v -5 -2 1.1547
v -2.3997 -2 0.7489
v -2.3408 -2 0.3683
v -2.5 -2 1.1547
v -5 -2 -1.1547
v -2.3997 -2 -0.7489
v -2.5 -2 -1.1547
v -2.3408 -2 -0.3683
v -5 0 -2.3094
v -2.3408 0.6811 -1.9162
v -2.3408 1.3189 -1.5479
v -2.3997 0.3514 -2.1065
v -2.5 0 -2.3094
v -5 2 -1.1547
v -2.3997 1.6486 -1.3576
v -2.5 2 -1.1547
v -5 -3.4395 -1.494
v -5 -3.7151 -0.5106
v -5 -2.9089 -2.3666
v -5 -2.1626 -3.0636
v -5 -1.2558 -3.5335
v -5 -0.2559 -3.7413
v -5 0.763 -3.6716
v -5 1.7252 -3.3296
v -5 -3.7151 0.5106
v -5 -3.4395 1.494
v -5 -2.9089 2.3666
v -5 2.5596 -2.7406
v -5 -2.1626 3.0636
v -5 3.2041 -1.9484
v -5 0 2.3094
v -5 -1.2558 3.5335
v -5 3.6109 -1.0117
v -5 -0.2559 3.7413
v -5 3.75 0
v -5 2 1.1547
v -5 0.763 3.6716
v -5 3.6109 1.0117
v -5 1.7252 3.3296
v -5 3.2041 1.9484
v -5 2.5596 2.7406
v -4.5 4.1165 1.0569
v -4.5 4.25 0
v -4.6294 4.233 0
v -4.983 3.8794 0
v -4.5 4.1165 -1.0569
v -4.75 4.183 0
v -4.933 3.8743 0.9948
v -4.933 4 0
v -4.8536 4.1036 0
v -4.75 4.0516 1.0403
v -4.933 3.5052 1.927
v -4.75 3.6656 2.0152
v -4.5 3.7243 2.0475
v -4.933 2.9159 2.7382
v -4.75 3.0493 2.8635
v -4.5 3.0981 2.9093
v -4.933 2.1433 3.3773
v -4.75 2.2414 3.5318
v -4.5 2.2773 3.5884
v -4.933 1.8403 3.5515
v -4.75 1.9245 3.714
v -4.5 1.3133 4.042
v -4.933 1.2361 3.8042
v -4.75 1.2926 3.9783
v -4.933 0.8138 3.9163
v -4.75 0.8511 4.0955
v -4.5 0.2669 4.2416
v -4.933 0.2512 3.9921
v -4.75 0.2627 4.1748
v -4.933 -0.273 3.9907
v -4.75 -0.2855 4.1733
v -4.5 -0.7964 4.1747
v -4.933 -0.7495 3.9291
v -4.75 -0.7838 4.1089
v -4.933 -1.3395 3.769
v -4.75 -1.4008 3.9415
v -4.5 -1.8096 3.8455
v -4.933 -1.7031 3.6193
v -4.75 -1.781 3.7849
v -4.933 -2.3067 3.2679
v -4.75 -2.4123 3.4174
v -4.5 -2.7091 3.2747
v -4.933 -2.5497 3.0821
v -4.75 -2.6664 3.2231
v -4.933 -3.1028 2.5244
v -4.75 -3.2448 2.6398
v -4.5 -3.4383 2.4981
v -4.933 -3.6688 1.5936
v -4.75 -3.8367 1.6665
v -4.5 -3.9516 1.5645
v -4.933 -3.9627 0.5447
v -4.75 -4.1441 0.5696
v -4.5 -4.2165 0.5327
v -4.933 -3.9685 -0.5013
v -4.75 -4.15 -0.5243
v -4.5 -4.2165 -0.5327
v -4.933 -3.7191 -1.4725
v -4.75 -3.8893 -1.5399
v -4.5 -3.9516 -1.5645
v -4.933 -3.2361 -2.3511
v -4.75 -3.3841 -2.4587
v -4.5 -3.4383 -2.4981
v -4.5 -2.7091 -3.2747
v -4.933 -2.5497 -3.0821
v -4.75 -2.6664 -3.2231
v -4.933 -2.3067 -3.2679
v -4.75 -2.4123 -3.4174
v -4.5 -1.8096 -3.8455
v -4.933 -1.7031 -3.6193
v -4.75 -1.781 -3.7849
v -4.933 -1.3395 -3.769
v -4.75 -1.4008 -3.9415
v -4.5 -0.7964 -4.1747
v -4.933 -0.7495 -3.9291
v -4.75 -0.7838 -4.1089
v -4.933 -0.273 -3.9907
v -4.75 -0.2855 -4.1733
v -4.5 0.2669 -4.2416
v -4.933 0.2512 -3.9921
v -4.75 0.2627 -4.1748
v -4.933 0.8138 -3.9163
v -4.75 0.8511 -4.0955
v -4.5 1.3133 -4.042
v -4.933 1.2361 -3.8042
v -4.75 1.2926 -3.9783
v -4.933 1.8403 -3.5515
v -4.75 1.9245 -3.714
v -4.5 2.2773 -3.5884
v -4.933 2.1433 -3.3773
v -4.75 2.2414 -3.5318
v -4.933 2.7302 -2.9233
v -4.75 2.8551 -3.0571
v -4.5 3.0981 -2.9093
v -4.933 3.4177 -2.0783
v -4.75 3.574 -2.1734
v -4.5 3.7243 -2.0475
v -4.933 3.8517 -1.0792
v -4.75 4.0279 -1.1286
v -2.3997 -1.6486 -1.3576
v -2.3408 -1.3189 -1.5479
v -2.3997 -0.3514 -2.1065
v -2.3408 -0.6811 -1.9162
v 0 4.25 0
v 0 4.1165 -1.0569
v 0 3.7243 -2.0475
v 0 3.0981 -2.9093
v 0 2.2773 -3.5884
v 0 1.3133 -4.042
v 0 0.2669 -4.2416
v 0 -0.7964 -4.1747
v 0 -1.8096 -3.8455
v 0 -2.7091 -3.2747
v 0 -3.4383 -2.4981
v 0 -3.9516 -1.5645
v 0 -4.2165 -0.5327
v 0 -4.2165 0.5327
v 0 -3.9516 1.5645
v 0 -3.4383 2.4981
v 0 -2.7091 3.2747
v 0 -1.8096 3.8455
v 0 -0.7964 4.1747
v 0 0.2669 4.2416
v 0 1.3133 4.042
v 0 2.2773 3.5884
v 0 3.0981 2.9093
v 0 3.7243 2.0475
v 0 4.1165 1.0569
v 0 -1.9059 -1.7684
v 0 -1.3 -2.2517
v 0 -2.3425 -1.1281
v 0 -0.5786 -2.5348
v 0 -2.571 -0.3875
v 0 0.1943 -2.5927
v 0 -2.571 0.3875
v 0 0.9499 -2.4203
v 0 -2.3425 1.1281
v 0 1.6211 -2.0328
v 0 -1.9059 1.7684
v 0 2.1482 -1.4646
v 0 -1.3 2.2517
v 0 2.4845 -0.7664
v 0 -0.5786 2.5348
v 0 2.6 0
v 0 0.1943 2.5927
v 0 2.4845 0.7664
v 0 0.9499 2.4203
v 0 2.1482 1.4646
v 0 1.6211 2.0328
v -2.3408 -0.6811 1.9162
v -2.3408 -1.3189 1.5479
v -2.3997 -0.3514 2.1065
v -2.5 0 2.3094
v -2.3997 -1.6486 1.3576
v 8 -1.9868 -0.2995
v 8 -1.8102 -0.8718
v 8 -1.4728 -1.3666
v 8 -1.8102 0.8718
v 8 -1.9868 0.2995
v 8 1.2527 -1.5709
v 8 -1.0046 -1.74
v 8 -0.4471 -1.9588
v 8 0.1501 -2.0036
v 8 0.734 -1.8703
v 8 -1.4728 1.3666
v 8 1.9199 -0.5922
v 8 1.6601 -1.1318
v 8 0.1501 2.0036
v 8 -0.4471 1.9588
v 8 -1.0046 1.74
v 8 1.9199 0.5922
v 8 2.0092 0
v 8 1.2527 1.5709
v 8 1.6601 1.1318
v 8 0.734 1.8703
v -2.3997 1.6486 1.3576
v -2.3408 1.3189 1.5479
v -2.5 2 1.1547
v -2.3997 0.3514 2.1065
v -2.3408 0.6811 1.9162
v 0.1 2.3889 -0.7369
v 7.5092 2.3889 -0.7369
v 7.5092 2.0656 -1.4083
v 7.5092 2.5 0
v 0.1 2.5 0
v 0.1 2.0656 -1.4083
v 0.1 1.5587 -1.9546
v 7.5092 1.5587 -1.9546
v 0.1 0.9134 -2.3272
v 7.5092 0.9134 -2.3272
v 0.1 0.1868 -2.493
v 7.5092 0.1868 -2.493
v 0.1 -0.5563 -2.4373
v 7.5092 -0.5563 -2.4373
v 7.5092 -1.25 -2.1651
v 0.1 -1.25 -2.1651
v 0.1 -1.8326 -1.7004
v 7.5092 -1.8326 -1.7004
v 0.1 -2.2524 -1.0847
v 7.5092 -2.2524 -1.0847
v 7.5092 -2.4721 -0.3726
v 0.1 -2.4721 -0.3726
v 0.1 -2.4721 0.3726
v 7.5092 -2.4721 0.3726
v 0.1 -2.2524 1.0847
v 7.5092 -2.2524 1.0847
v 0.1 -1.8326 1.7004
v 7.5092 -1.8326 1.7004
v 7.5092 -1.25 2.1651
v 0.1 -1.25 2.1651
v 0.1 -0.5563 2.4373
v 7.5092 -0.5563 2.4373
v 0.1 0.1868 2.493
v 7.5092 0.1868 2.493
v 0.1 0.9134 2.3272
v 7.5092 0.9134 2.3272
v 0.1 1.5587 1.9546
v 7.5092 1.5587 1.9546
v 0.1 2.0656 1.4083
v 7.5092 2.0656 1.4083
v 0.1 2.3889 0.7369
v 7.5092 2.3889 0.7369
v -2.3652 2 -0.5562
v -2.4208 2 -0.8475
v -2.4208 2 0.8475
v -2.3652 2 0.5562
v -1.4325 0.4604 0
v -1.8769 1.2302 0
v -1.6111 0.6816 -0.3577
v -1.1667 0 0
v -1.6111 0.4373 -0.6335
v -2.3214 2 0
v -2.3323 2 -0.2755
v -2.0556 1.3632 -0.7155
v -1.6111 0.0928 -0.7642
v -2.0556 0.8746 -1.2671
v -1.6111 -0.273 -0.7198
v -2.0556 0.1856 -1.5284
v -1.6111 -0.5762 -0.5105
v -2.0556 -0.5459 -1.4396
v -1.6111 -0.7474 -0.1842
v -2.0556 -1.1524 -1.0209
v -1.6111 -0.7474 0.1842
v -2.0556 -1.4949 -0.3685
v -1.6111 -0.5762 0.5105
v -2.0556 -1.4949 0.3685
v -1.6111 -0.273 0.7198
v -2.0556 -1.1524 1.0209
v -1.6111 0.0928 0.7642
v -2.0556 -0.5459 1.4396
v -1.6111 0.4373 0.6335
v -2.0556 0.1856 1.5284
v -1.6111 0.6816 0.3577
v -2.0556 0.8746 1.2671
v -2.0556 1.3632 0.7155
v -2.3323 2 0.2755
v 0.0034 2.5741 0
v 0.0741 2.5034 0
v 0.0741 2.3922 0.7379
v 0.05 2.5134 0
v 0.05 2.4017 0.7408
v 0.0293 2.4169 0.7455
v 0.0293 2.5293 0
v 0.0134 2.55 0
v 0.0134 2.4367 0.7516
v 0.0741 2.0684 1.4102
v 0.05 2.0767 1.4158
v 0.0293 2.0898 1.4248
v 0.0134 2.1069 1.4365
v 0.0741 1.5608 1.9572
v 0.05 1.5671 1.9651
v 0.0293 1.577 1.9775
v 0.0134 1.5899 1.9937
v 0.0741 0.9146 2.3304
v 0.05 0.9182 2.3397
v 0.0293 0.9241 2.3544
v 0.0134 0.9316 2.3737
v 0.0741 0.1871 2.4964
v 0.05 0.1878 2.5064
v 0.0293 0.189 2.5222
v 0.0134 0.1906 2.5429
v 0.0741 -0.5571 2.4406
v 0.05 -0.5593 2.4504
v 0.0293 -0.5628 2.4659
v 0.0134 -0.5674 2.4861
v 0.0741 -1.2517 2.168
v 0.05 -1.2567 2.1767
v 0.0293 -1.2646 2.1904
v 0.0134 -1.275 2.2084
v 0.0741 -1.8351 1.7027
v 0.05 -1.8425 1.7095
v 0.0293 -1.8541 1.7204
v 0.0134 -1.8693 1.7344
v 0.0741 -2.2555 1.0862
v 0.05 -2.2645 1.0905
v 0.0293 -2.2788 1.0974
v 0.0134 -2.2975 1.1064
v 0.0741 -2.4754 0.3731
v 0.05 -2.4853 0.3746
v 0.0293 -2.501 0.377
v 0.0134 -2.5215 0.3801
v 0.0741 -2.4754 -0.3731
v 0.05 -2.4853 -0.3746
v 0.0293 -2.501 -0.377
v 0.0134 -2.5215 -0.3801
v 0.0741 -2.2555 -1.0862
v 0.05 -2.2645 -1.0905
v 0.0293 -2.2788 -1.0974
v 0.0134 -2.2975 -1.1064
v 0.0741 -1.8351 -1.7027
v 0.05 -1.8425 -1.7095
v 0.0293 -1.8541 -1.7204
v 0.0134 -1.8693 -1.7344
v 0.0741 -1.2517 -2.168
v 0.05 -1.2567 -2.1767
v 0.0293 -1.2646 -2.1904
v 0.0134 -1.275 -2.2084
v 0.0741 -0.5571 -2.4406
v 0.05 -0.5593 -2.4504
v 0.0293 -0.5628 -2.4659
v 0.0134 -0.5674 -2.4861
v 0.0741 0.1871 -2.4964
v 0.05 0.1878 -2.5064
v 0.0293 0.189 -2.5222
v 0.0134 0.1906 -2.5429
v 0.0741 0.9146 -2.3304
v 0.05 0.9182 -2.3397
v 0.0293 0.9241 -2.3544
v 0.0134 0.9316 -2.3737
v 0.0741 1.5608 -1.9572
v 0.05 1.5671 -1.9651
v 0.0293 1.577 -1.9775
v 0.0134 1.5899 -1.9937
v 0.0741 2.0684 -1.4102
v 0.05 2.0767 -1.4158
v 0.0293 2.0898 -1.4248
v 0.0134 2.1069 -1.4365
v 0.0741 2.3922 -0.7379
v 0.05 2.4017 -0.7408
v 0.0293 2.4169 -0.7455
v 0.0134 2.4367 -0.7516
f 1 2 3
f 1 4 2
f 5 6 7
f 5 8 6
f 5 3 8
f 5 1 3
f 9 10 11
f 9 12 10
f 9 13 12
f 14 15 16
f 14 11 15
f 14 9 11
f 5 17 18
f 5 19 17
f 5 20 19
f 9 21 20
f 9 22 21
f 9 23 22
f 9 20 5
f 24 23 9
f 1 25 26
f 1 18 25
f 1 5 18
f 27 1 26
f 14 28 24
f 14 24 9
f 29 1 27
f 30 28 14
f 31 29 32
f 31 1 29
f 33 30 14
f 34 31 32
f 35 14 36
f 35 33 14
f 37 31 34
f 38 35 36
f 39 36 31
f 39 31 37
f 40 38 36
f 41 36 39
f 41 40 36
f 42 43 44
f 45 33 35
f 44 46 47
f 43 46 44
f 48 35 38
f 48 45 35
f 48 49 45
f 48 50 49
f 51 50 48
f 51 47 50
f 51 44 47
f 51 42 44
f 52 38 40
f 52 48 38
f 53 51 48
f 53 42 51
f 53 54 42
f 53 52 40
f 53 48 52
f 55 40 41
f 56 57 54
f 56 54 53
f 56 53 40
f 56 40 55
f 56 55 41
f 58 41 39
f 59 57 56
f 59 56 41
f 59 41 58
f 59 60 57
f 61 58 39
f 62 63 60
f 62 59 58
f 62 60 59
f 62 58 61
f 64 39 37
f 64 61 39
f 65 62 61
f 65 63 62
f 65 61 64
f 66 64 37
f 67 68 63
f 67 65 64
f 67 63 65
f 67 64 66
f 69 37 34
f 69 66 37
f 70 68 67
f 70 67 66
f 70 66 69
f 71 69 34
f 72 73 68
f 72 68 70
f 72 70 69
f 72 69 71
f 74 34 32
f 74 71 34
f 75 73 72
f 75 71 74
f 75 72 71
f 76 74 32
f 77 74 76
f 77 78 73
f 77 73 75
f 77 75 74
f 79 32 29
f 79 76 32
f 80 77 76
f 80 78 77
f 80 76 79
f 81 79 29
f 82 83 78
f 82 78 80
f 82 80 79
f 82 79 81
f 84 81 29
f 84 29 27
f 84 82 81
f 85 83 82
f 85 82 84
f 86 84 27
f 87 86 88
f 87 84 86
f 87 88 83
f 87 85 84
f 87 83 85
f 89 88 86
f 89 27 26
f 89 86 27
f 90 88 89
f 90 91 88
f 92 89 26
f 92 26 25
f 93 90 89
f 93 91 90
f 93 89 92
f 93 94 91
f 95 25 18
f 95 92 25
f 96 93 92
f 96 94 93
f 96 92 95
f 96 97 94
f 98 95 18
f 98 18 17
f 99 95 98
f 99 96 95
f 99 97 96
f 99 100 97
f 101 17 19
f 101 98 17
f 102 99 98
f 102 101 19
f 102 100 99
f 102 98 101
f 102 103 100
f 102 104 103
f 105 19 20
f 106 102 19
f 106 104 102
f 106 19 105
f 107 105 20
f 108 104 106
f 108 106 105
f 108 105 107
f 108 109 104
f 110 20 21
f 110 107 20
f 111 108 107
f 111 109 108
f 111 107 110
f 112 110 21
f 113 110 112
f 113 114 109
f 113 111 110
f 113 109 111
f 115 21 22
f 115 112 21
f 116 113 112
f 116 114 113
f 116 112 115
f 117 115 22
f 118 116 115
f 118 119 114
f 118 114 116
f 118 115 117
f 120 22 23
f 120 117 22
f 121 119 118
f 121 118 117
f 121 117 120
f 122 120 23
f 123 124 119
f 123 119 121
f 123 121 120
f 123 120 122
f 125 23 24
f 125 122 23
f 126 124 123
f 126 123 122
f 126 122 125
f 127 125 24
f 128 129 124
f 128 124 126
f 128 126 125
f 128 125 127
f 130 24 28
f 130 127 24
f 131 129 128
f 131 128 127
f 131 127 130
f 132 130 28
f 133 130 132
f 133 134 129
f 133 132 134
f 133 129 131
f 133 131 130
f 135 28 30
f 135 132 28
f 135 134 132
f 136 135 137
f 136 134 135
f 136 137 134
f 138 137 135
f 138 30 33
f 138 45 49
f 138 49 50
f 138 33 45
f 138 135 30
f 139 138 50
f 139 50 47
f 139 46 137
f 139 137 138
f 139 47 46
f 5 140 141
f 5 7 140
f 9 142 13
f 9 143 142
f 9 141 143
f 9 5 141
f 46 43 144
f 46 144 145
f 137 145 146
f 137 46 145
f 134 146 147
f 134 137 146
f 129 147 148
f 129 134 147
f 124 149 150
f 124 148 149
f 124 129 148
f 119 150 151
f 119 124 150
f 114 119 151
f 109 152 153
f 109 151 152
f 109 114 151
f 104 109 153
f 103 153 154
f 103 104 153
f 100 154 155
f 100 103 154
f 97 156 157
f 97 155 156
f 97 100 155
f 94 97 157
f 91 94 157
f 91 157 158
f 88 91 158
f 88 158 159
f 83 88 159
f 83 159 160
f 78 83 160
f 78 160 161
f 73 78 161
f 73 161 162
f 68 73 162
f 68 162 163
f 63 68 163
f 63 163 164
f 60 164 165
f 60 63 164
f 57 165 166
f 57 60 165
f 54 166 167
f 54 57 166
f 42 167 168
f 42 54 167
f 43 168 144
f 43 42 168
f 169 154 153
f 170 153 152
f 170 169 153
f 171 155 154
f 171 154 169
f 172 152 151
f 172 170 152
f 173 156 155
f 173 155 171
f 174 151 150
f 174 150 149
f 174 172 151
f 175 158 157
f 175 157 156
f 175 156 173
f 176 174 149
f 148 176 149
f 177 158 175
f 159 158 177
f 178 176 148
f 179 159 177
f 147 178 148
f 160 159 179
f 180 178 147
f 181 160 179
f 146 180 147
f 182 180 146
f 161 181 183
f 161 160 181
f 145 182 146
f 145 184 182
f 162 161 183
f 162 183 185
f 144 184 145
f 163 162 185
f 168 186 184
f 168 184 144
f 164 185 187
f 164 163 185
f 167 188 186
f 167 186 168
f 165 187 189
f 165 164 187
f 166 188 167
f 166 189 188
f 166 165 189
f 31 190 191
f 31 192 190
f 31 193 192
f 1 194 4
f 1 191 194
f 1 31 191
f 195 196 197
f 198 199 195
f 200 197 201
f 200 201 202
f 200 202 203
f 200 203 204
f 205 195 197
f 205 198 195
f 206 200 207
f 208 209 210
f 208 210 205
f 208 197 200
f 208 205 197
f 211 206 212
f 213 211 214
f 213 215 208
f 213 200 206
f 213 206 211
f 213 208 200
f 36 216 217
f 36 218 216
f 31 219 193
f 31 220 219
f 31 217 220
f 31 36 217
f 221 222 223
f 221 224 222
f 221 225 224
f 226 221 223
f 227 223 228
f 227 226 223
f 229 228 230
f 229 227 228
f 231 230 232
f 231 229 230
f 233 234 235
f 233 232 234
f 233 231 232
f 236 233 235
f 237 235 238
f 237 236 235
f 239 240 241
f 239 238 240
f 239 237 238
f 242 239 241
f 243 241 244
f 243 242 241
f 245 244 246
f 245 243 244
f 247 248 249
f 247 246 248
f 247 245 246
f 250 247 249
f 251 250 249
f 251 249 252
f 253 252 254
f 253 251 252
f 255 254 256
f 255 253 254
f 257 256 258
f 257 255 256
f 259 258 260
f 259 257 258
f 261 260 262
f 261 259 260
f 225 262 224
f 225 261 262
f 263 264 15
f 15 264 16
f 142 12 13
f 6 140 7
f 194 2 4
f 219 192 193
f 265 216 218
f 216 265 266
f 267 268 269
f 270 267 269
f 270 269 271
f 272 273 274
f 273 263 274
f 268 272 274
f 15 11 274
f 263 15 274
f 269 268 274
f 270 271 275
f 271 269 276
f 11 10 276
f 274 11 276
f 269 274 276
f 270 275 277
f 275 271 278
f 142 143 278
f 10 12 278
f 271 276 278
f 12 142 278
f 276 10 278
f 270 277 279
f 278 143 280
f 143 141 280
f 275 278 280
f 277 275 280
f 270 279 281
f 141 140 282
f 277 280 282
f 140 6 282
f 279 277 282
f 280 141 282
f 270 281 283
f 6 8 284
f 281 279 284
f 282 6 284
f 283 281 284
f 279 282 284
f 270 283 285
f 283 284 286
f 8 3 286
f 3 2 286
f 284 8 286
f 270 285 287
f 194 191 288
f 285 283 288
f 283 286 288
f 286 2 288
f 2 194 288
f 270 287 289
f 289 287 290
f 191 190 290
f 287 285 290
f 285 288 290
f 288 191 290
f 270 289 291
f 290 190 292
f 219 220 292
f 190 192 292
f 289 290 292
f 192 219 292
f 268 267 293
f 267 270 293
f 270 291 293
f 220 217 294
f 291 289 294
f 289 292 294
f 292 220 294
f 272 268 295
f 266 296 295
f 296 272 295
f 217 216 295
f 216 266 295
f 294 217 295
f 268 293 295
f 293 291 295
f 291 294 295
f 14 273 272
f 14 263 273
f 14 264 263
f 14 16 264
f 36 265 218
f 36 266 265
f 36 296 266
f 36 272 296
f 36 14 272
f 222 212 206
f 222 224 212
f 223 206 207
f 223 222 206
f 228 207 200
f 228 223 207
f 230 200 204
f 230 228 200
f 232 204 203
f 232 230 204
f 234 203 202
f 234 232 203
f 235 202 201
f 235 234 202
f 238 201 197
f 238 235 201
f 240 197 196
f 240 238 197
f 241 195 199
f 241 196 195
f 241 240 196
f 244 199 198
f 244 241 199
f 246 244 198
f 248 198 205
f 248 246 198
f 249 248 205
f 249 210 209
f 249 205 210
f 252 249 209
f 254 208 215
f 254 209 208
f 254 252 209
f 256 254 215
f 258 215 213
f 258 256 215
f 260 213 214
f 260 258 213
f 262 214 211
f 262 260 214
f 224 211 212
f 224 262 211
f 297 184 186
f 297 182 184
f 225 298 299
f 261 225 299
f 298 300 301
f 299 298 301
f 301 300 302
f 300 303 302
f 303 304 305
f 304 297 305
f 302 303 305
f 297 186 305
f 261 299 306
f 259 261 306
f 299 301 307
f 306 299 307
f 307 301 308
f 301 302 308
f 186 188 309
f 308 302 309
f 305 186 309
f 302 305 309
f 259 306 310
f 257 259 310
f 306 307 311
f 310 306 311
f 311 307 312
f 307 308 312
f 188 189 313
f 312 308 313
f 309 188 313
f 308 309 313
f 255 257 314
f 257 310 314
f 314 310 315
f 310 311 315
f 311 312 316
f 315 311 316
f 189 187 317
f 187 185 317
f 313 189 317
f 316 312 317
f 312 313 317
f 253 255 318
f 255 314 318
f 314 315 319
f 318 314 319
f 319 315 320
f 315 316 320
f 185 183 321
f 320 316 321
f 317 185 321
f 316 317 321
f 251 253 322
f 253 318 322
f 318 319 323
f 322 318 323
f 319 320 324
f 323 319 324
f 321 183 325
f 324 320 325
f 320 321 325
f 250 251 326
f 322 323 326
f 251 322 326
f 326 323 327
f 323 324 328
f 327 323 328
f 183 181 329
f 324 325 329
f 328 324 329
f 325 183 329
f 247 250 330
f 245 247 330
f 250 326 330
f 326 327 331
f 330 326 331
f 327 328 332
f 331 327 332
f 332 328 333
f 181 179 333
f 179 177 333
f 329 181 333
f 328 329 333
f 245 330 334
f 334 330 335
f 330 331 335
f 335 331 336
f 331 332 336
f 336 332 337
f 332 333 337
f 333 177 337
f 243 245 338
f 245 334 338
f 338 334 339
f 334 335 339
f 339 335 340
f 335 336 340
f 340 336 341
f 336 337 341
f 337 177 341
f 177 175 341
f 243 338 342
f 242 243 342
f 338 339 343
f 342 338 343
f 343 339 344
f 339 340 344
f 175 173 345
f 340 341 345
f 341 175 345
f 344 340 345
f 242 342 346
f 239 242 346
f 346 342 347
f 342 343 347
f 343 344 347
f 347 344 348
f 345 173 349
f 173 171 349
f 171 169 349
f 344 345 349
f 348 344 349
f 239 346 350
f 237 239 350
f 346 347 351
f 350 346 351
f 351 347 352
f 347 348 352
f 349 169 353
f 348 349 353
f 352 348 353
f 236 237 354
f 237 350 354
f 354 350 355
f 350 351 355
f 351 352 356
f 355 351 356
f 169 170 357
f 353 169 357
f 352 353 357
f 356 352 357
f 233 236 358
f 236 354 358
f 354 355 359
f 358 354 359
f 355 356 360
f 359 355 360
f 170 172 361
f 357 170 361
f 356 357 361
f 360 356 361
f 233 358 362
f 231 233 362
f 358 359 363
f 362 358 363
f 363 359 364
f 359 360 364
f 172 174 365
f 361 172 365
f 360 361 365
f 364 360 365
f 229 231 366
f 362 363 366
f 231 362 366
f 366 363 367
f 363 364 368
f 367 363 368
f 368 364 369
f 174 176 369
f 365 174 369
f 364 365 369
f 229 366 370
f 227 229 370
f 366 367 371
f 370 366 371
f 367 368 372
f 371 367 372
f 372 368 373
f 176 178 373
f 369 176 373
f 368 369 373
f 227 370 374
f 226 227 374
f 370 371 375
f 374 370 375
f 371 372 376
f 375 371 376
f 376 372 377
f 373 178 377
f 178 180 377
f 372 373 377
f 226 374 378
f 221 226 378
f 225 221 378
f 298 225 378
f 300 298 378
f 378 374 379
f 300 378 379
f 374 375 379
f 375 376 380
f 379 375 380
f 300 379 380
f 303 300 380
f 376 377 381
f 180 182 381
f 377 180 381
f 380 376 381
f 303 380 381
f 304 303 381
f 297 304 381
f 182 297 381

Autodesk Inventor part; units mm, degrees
ref_plane "YZ Plane" through (0, 0, 0) normal (1, 0, 0) x (0, 1, 0)
ref_plane "XZ Plane" through (0, 0, 0) normal (0, 1, 0) x (-1, 0, 0)
sketch "Esquisse1" plane through (0, 0, 0) normal (0, 0, 1) x (1, 0, 0)
  line L0 (-1.1667, 0) -> (8, 0)
  line L1 (8, 0) -> (8, 2.5)
  line L2 (8, 2.5) -> (2, 2.5)
  line L3 (2, 2.5) -> (1.5091, 2.5)
  line L4 (1.5091, 2.5) -> (0, 2.5)
  line L5 (0, 2.5) -> (0, 4.25)
  line L6 (0, 4.25) -> (-5, 4.25)
  line L7 (-5, 4.25) -> (-5, 2.3094)
  line L8 (-5, 2.3094) -> (-2.5, 2.3094)
  line L9 (-2.5, 2.3094) -> (-1.1667, 0)
  line L10 (-7.6, 0) -> (10.6, 0) projected
  line L11 (0, -0.85) -> (0, 5.1) projected
  line L12 (2, 2.5) -> (0, 2.5) construction
  dimension "d1" = 6
  dimension "d2" = 0.4909
  dimension "d3" = 5
  dimension "d4" = 2.5
  dimension "d5" = 60
  dimension "d6" = 5
  dimension "d7" = 5
  dimension "d8" = 4.6188
  dimension "d9" = 8.5
  dimension "d26" = 8
revolve "Corps" add sketch "Esquisse1" angle 360 about axis through (-1.1667, 0, 0) along (1, 0, 0)
sketch "Esquisse2" plane through (-5, 0, 0) normal (-1, 0, 0) x (0, 0, 1)
  circle A0 centre (0, 0) radius 2.3094 projected
  line L0 (0, -5.95) -> (0, 5.95) projected
  line L1 (-5.95, 0) -> (5.95, 0) projected
  line L2 (2.3094, 0) -> (1.1547, -2)
  line L3 (1.1547, -2) -> (-1.1547, -2)
  line L4 (-1.1547, -2) -> (-2.3094, 0)
  line L5 (-2.3094, 0) -> (-1.1547, 2)
  line L6 (-1.1547, 2) -> (1.1547, 2)
  line L7 (1.1547, 2) -> (2.3094, 0)
extrude "Rainure" add sketch "Esquisse2" against normal up to next contours L7 A0 | A0 L2 | L6 L0 A0 | A0 L0 L3 | L0 L6 A0 | A0 L3 L0 | L4 A0 | A0 L5
fillet "Congé1" radius 0.5 1 edges at (-5, -4.25, 0)
thread "Filetage" size "M5x0.8" class "6g" standard "ISO Metric profile" length 6
chamfer "Chanfrein1" distance 0.4908 distance2 0.4908 1 edges at (8, -2.5, 0) measured on face at (8, -0.6238, -0.819)
ref_plane "Work Plane1" through (29, 0, 0) normal (0, -1, 0) x (1, 0, 0)
fillet "Fillet2" radius 0.1 1 edges at (0, -2.5, 0)
equation "\"d30\" = R"
equation "\"d17\" = RR"
equation "\"d13\" = GEL"
equation "\"d15\" = -0.5 * SPD + 0.5 * GD"
equation "\"d16\" = GUL"
equation "\"d1\" = GEL"
equation "\"d3\" = KOH"
equation "\"d4\" = INTI"
equation "\"d6\" = GD"
equation "\"d7\" = BDM"
equation "\"d8\" = 1.1547 * SW"
equation "\"d9\" = KOD"
equation "\"d26\" = NLG"
equation "\"GD\" = 5"
equation "\"NLG\" = 8"
equation "\"GEL\" = 6"
equation "\"KOD\" = 8.5"
equation "\"KOH\" = 5"
equation "\"INTI\" = 2.5"
equation "\"GAL\" = 0.61345 * PTC"
equation "\"GUL\" = 0.61345 * PTC"
equation "\"BDM\" = NND"
equation "\"SW\" = 4"
equation "\"RR\" = 0.5"
equation "\"SPD\" = NND - 1.2269 * PTC"
equation "\"R\" = 0.1"
equation "\"TOA\" = 30deg"
equation "\"GD1\" = THREADDIA - 1.2269 * PTC"
equation "\"THREADDIA\" = 5"
equation "\"FAWI\" = 45deg"
equation "\"PTC\" = 0.8"
equation "\"NND\" = 5"
equation "\"E0\" = 1.155 * SW"
properties part number "ISO 4762 - M5 x 8" material "Acier inoxydable 440C"
